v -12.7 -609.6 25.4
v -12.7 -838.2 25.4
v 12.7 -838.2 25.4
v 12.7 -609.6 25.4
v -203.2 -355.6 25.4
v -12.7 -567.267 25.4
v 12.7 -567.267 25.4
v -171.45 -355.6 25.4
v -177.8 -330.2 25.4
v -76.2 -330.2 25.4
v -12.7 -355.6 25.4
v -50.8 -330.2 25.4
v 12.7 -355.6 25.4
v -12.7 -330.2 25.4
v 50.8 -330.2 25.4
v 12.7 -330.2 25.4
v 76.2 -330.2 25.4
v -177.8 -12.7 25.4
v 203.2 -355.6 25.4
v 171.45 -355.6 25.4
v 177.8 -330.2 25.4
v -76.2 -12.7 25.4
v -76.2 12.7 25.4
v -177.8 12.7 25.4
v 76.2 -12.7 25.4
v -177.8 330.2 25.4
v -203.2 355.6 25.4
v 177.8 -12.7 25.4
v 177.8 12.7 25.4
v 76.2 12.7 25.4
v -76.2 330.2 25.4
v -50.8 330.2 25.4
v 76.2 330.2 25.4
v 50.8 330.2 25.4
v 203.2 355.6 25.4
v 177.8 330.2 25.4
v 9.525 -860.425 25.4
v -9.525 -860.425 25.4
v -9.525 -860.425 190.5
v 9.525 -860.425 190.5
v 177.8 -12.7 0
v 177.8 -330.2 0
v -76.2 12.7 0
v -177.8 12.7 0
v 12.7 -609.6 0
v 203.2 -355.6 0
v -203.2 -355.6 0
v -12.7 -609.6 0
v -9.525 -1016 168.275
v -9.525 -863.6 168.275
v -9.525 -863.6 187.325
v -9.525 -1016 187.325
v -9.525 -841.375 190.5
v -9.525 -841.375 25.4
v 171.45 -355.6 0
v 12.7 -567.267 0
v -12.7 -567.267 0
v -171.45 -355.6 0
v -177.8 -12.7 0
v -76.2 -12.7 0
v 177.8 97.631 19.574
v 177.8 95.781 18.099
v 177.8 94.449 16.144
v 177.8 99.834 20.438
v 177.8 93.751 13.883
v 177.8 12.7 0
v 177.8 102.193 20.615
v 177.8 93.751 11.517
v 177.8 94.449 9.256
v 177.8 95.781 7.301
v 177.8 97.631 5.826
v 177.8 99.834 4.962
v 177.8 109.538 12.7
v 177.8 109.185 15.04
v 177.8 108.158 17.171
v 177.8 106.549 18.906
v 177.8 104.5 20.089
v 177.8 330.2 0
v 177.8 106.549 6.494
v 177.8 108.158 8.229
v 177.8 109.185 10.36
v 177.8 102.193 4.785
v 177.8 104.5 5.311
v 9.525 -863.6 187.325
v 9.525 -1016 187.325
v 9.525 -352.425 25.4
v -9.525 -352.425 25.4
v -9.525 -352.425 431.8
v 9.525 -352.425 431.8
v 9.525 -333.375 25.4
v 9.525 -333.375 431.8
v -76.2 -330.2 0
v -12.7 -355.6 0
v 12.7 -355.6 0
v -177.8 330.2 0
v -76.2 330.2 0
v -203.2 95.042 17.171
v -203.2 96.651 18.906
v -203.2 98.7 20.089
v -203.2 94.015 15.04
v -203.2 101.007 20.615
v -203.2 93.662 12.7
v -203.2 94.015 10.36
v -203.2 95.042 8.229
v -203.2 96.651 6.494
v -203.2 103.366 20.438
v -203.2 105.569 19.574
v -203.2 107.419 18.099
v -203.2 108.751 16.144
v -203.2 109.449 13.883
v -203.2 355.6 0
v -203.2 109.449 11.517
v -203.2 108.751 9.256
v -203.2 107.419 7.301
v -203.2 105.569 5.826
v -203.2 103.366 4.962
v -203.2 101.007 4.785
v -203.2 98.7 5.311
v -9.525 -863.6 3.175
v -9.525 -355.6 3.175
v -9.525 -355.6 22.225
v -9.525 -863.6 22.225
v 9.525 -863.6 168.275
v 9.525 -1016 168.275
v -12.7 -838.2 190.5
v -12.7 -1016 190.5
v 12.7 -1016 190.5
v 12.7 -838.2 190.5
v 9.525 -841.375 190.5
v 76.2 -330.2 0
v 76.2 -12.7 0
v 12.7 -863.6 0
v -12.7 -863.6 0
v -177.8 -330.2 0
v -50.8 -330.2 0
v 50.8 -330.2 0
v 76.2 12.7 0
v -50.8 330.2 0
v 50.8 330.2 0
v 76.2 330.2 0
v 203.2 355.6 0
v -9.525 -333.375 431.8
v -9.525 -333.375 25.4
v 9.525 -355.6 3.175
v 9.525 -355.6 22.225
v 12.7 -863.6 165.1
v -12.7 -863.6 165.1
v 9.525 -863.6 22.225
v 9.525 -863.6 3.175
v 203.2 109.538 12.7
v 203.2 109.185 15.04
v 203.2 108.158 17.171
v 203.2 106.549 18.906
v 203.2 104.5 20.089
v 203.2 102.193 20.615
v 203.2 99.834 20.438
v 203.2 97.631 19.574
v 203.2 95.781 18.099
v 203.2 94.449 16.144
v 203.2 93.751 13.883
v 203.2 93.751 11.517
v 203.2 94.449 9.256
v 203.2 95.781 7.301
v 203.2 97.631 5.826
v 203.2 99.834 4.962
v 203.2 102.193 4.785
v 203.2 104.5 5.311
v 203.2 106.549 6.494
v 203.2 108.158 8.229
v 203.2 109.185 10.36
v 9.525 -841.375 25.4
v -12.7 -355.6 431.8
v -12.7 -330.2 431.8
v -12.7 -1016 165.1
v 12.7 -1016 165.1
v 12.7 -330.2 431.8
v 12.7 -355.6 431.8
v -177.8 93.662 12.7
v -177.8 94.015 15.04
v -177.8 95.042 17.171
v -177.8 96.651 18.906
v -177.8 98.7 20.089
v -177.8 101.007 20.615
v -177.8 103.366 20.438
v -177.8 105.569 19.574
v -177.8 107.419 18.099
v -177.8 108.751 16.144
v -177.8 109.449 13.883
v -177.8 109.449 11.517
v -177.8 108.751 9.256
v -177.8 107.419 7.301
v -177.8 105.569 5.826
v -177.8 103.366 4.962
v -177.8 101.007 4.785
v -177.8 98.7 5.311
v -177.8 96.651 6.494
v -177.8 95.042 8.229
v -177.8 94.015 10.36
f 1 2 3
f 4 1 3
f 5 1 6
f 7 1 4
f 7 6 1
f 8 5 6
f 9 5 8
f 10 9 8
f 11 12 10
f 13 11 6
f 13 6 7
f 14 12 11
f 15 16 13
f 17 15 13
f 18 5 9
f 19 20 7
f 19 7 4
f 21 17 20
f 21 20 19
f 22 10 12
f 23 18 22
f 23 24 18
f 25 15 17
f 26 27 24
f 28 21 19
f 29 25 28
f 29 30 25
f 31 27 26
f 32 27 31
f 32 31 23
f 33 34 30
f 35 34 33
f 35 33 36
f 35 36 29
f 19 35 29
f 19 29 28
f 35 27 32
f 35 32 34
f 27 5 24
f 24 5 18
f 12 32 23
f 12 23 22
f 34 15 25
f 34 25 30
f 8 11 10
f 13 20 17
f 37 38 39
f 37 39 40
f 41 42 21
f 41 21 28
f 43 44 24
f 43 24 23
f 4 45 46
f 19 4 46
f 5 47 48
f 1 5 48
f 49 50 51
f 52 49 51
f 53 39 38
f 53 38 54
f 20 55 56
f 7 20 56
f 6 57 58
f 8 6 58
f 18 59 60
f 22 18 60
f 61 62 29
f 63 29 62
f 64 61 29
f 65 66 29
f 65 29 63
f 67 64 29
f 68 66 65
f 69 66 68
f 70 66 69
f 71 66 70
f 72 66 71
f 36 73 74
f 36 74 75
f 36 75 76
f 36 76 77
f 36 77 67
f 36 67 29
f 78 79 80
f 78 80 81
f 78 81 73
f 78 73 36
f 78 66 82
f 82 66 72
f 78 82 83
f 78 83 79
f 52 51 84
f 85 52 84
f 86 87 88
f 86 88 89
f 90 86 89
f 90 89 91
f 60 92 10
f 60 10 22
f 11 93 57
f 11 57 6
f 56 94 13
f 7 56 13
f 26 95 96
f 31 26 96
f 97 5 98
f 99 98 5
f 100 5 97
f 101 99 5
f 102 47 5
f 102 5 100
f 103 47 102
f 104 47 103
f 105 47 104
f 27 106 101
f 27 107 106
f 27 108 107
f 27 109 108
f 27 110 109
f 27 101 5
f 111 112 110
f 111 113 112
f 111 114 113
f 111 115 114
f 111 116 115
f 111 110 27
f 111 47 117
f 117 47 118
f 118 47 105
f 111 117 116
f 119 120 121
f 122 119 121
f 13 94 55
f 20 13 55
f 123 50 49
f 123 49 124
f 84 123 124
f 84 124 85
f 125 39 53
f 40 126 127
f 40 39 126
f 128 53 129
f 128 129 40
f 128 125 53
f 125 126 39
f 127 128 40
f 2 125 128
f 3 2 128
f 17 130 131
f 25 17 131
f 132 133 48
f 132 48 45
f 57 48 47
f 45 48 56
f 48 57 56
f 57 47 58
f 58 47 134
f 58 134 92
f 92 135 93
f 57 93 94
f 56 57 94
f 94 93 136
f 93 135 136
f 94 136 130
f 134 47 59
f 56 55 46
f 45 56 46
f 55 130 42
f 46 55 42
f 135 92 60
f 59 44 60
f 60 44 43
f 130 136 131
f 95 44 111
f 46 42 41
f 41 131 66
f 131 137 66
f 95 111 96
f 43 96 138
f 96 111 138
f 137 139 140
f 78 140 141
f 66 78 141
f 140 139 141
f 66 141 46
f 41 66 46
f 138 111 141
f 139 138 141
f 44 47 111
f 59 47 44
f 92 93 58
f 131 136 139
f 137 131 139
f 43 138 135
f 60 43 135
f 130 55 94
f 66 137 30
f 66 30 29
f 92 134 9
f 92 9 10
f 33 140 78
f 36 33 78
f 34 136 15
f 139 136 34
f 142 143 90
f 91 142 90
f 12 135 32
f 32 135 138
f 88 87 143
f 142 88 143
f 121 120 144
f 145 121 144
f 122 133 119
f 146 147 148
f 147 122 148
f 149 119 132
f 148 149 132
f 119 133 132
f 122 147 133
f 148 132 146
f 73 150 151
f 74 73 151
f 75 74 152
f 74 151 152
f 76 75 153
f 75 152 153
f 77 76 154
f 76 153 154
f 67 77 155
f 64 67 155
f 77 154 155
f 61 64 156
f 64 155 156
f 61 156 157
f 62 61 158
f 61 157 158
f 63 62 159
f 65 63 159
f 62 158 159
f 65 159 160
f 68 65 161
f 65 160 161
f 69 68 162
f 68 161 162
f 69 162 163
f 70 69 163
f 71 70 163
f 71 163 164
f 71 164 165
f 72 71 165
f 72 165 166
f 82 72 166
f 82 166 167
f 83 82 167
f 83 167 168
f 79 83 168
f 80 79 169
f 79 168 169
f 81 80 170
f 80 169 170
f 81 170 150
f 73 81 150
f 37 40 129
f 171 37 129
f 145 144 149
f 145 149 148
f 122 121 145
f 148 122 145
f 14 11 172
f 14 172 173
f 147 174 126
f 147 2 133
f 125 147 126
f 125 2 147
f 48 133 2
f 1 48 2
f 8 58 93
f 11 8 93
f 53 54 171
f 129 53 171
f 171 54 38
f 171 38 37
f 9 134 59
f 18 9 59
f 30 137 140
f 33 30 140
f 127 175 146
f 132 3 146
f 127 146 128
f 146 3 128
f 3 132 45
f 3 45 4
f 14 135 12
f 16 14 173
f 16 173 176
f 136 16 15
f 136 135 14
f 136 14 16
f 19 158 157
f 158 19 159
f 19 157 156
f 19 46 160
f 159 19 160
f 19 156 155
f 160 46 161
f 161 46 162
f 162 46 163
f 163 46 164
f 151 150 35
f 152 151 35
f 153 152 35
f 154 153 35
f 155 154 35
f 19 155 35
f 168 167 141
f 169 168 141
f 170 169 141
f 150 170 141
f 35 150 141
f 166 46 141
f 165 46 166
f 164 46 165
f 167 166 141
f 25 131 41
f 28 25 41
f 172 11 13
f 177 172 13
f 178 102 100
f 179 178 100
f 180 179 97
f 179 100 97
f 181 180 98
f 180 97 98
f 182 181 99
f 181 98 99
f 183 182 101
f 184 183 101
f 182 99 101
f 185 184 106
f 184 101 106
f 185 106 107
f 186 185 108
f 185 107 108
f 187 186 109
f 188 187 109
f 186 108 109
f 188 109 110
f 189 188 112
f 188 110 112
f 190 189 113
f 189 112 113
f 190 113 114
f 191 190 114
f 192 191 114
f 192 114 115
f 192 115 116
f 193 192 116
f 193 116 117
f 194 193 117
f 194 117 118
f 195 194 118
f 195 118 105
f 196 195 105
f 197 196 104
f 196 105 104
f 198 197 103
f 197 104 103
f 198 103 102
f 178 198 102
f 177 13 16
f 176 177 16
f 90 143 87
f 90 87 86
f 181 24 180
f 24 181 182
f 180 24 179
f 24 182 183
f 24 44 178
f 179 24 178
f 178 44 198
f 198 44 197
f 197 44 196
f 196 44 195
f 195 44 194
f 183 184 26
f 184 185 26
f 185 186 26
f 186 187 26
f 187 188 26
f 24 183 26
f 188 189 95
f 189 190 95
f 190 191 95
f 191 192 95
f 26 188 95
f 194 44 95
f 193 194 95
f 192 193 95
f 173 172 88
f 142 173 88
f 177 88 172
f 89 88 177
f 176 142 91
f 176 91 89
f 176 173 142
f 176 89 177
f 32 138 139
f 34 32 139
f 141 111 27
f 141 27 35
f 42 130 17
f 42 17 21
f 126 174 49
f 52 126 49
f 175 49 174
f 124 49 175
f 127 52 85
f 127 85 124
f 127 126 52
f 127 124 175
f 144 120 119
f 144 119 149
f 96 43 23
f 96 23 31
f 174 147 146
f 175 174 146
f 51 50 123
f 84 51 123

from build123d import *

# Parameters (mm, degrees)
F0_W      = 406.4
F0_H      = 711.2
F0_W_2    = 101.6
F0_H_2    = 317.5
F0_H_3    = 660.4
F1_DEPTH  = 25.4
F2_W      = 25.4
F2_H      = 25.4
F2_W_2    = 19.05
F2_H_2    = 19.05
F3_DEPTH  = 406.4
F4_R      = 7.9375
F5_DEPTH  = 25.4
F6_R      = 7.9375
F7_DEPTH  = 25.4
F8_W      = 25.4
F8_H      = 25.4
F8_W_2    = 19.05
F8_H_2    = 19.05
F9_DEPTH  = 508
F10_W     = 25.4
F10_H     = 25.4
F10_W_2   = 19.05
F10_H_2   = 19.05
F11_DEPTH = 165.1
F12_W     = 25.4
F12_H     = 25.4
F12_W_2   = 19.05
F12_H_2   = 19.05
F13_DEPTH = 152.4
F15_DEPTH = 25.4


with BuildPart() as f1:
    # F0 (on Top) → F1 (new body)
    with BuildSketch(Plane.XY):
        Rectangle(F0_W, F0_H)
        with Locations((-127, -171.45)):
            Rectangle(F0_W_2, F0_H_2, mode=Mode.SUBTRACT)
        with Locations((127, -171.45)):
            Rectangle(F0_W_2, F0_H_2, mode=Mode.SUBTRACT)
        with Locations((-127, 171.45)):
            Rectangle(F0_W_2, F0_H_2, mode=Mode.SUBTRACT)
        Rectangle(F0_W_2, F0_H_3, mode=Mode.SUBTRACT)
        with Locations((127, 171.45)):
            Rectangle(F0_W_2, F0_H_2, mode=Mode.SUBTRACT)
    extrude(amount=F1_DEPTH)

    # F2 (on face) → F3 (join)
    with BuildSketch(Plane.XY.offset(25.4)):
        with Locations((0, -342.9)):
            Rectangle(F2_W, F2_H)
        with Locations((0, -342.9)):
            Rectangle(F2_W_2, F2_H_2, mode=Mode.SUBTRACT)
    extrude(amount=F3_DEPTH)

    # F4 (on face) → F5 (cut)
    with BuildSketch(Plane.YZ.offset(203.2)):
        with Locations((101.6, 12.7)):
            Circle(F4_R)
    extrude(amount=-F5_DEPTH, mode=Mode.SUBTRACT)

    # F6 (on face) → F7 (cut)
    with BuildSketch(Plane(origin=(-203.2, 0, 0), x_dir=(0, -1, 0), z_dir=(-1, 0, 0))):
        with Locations((-101.6, 12.7)):
            Circle(F6_R)
    extrude(amount=-F7_DEPTH, mode=Mode.SUBTRACT)

    # F8 (on face) → F9 (join)
    with BuildSketch(Plane.XZ.offset(355.6)):
        with Locations((0, 12.7)):
            Rectangle(F8_W, F8_H)
        with Locations((0, 12.7)):
            Rectangle(F8_W_2, F8_H_2, mode=Mode.SUBTRACT)
    extrude(amount=F9_DEPTH)

    # F10 (on face) → F11 (join)
    with BuildSketch(Plane.XY.offset(25.4)):
        with Locations((0, -850.9)):
            Rectangle(F10_W, F10_H)
        with Locations((0, -850.9)):
            Rectangle(F10_W_2, F10_H_2, mode=Mode.SUBTRACT)
    extrude(amount=F11_DEPTH)

    # F12 (on face) → F13 (join)
    with BuildSketch(Plane.XZ.offset(863.6)):
        with Locations((0, 177.8)):
            Rectangle(F12_W, F12_H)
        with Locations((0, 177.8)):
            Rectangle(F12_W_2, F12_H_2, mode=Mode.SUBTRACT)
    extrude(amount=F13_DEPTH)

    # F14 (on Top) → F15 (join)
    with BuildSketch(Plane.XY):
        Polygon((-171.45, -355.6), (-203.2, -355.6), (-12.7, -609.6), (-12.7, -567.266667), align=None)
        Polygon((12.7, -609.6), (203.2, -355.6), (171.45, -355.6), (12.7, -567.266667), align=None)
    extrude(amount=F15_DEPTH)


solid = f1.part
